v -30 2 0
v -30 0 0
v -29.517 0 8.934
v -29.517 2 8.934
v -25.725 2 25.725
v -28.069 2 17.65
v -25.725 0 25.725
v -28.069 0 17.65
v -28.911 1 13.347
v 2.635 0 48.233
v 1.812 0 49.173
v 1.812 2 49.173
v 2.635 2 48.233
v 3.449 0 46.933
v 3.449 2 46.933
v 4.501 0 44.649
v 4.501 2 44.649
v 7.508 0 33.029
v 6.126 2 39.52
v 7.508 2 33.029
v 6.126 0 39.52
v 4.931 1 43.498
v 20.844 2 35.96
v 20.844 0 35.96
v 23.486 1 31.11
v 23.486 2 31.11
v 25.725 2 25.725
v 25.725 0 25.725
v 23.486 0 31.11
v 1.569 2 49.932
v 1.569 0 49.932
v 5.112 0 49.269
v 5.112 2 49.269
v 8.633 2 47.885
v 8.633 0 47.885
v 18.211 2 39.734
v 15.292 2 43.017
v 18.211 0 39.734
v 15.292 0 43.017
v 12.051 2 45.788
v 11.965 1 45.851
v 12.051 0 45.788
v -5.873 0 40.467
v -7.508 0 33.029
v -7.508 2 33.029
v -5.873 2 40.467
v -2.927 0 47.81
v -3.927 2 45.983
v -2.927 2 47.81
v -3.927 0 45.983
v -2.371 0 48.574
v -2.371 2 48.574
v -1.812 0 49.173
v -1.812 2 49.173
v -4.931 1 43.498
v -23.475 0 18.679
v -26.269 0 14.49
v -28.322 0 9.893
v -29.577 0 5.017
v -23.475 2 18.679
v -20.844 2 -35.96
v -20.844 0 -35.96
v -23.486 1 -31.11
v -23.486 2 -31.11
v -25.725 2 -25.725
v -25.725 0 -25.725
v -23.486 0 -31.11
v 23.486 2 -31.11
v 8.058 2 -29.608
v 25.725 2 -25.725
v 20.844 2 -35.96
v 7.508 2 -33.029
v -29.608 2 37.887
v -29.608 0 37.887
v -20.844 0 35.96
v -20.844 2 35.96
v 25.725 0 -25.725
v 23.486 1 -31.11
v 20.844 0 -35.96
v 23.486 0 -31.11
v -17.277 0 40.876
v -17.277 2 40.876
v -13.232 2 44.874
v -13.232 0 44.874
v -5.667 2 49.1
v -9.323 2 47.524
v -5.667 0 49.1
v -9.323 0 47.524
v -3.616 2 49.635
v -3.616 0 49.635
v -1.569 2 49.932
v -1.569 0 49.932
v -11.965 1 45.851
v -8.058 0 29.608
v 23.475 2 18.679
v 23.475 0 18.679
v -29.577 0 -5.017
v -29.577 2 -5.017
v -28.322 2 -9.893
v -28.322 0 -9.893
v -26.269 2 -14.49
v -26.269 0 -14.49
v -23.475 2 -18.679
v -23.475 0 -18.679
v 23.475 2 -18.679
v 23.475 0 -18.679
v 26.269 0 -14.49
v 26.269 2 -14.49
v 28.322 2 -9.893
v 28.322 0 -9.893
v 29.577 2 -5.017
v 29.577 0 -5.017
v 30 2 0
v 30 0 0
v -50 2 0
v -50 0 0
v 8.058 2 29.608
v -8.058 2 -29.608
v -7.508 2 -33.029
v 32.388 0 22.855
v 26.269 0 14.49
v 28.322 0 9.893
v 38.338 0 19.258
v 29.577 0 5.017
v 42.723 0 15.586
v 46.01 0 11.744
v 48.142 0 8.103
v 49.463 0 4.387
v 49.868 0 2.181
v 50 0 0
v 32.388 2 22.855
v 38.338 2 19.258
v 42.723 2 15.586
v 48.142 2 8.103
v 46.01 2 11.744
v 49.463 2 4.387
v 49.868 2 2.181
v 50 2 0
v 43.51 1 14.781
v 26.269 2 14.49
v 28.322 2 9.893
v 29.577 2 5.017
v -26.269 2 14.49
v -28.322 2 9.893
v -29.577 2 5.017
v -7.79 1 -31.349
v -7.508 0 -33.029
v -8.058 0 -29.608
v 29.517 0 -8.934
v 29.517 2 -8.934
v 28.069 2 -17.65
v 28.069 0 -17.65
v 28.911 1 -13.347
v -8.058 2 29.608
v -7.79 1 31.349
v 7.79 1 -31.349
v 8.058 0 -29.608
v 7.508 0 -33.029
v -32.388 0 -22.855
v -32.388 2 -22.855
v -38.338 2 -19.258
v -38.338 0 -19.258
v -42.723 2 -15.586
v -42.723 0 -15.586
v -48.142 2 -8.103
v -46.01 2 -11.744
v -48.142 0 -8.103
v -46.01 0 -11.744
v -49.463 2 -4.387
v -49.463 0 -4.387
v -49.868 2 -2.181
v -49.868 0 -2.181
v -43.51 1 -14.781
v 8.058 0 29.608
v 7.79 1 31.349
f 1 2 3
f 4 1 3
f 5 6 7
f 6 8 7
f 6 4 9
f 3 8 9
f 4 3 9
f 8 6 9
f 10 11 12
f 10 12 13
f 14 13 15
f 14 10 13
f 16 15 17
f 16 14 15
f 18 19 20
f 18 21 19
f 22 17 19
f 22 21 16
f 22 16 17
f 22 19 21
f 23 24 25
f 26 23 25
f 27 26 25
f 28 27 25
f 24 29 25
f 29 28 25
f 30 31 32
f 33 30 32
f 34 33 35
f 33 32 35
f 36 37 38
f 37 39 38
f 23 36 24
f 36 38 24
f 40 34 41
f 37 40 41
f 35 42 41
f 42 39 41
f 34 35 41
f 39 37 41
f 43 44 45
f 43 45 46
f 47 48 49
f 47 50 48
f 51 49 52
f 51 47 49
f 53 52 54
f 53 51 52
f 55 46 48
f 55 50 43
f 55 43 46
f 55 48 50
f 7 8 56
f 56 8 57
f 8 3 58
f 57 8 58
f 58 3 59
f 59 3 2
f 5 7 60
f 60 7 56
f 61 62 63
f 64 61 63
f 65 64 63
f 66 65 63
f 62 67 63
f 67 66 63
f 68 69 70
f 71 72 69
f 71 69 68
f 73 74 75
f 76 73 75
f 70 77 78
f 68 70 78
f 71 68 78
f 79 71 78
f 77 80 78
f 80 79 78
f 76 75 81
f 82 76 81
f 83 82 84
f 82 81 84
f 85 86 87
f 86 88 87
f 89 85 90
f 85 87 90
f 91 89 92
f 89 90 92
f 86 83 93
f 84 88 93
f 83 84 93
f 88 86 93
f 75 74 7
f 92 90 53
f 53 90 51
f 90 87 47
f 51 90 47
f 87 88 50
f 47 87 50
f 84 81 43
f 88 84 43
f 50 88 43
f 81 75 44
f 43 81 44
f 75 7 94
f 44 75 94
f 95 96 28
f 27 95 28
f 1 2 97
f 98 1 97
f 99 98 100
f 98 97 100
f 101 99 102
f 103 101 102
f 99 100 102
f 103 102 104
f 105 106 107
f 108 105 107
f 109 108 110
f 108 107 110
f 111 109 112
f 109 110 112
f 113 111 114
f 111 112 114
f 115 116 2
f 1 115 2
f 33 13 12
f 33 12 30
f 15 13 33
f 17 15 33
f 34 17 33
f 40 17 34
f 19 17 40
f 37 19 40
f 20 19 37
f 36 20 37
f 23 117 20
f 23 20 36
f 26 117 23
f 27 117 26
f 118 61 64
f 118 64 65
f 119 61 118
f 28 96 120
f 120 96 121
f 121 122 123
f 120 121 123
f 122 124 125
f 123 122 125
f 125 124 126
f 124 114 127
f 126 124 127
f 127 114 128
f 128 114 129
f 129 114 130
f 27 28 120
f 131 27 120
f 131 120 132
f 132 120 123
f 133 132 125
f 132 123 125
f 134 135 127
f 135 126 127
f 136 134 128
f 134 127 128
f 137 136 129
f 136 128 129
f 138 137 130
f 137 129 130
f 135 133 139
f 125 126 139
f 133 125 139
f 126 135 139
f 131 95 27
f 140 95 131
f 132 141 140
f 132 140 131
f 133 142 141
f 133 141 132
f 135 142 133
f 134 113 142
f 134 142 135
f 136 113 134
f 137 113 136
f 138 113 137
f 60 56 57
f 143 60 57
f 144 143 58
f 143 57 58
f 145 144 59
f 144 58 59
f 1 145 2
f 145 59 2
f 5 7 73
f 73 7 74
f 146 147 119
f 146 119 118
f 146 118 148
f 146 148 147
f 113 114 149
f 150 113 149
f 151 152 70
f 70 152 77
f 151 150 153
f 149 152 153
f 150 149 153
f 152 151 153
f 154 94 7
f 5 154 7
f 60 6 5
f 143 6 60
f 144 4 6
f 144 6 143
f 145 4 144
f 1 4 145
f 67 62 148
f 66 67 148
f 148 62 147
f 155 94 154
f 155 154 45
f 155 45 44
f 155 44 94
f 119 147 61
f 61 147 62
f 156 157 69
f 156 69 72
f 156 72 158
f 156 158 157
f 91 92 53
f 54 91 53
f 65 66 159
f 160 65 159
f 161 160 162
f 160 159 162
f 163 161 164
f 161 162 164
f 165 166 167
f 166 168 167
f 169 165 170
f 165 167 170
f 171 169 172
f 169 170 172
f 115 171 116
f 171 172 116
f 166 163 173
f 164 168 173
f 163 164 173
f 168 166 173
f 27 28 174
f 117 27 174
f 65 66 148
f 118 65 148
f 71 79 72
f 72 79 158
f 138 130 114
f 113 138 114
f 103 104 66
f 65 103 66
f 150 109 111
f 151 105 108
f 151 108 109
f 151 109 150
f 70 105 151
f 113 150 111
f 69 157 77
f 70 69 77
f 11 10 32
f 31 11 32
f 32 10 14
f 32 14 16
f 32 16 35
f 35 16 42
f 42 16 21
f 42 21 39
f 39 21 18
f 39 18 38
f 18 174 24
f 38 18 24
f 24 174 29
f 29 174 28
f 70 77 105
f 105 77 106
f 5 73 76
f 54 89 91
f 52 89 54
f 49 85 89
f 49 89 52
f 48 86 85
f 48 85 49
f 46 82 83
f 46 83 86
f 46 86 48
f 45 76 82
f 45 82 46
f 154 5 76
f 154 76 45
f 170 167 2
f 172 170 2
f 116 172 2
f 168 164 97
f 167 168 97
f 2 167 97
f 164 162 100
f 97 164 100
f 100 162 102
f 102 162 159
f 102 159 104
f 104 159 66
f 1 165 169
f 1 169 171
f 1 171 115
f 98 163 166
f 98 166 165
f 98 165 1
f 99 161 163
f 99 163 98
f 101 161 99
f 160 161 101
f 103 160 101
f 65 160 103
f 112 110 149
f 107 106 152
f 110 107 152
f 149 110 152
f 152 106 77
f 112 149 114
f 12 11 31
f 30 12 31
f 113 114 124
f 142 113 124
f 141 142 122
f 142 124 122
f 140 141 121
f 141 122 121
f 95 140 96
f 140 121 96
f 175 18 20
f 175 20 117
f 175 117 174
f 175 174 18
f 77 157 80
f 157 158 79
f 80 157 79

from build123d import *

# Parameters (mm, degrees)
DODANIE_WYCI_GNI_CIE1_DEPTH   = 2
DODANIE_WYCI_GNI_CIE1_2_DEPTH = 2
DODANIE_WYCI_GNI_CIE1_3_DEPTH = 2
DODANIE_WYCI_GNI_CIE1_4_DEPTH = 2
DODANIE_WYCI_GNI_CIE1_5_DEPTH = 2
DODANIE_WYCI_GNI_CIE1_6_DEPTH = 2
DODANIE_WYCI_GNI_CIE1_7_DEPTH = 2
DODANIE_WYCI_GNI_CIE1_8_DEPTH = 2


with BuildPart() as part:
    # Szkic1 → Dodanie-wyciągnięcie1 (new body)
    with BuildSketch(Plane(origin=(0, 0, 0), x_dir=(1, 0, 0), z_dir=(0, 1, 0))):
        with BuildLine():
            Line((-25.724787771, 25.724787771), (-8.05822964, 29.607826273))
            add(Edge.make_bspline(
                [(-7.507535684, 33.029118956), (-7.79792239, 31.378992774), (-8.05822964, 29.607826273)],
                knots=[0.849202104, 0.849202104, 0.849202104, 0.937063931, 0.937063931, 0.937063931], degree=2, weights=[1, 0.999035193, 1]))
            Line((-7.507535684, 33.029118956), (-20.843852414, 35.960387795))
            add(Edge.make_bspline(
                [(-20.843852414, 35.960387795), (-23.68927397, 31.378992774), (-25.724787771, 25.724787771)],
                knots=[3.909727591, 3.909727591, 3.909727591, 4.17196948, 4.17196948, 4.17196948], degree=2, weights=[1, 0.991415958, 1]))
        make_face()
    extrude(amount=DODANIE_WYCI_GNI_CIE1_DEPTH)


with BuildPart() as body_2:
    # Szkic1 → Dodanie-wyci_gni_cie1 2 (new body)
    with BuildSketch(Plane(origin=(0, 0, 0), x_dir=(1, 0, 0), z_dir=(0, 1, 0))):
        with BuildLine():
            Line((-23.475270357, 18.679177757), (-25.724787771, 25.724787771))
            add(Edge.make_bspline(
                [(-25.724787771, 25.724787771), (-50, 16.985711369), (-50, 0)],
                knots=[2.111215827, 2.111215827, 2.111215827, 3.141592654, 3.141592654, 3.141592654], degree=2, weights=[1, 0.870199907, 1]))
            Line((-50, 0), (-30, 0))
            ThreePointArc((-30, 9.5e-08), (-28.321882961, 9.892974554), (-23.475270357, 18.679177757))
        make_face()
    extrude(amount=DODANIE_WYCI_GNI_CIE1_2_DEPTH)


with BuildPart() as body_3:
    # Szkic1 → Dodanie-wyci_gni_cie1 3 (new body)
    with BuildSketch(Plane(origin=(0, 0, 0), x_dir=(1, 0, 0), z_dir=(0, 1, 0))):
        with BuildLine():
            ThreePointArc((-23.475270357, -18.679177757), (-28.321882992, -9.892974465), (-30, 9.5e-08))
            add(Edge.make_bspline(
                [(-30, 9.5e-08), (-30.000000016, -13.849198204), (-25.724787771, -25.724787771)],
                knots=[4.712388978, 4.712388978, 4.712388978, 5.252808481, 5.252808481, 5.252808481], degree=2, weights=[1, 0.963714928, 1]))
            Line((-25.724787771, -25.724787771), (-23.475270357, -18.679177757))
        make_face()
    extrude(amount=DODANIE_WYCI_GNI_CIE1_3_DEPTH)


with BuildPart() as body_4:
    # Szkic1 → Dodanie-wyci_gni_cie1 4 (new body)
    with BuildSketch(Plane(origin=(0, 0, 0), x_dir=(1, 0, 0), z_dir=(0, 1, 0))):
        with BuildLine():
            Line((-29.607826273, -37.88667404), (-20.843852414, -35.960387795))
            add(Edge.make_bspline(
                [(-20.843852414, -35.960387795), (-12.774167321, -48.953336072), (-1.56928672, -49.931545896)],
                knots=[5.51505037, 5.51505037, 5.51505037, 6.230851865, 6.230851865, 6.230851865], degree=2, weights=[1, 0.936634273, 1]))
            Line((-1.56928672, -49.931545896), (-1.811566447, -49.17271271))
            add(Edge.make_bspline(
                [(-7.507535684, -33.029118956), (-5.218865934, -46.034514162), (-1.811566447, -49.17271271)],
                knots=[2.292390549, 2.292390549, 2.292390549, 2.959430225, 2.959430225, 2.959430225], degree=2, weights=[1, 0.944895907, 1]))
            add(Edge.make_bspline(
                [(-8.05822964, -29.607826273), (-7.79792239, -31.378992774), (-7.507535684, -33.029118956)],
                knots=[2.204528722, 2.204528722, 2.204528722, 2.292390549, 2.292390549, 2.292390549], degree=2, weights=[1, 0.999035193, 1]))
            Line((-8.05822964, -29.607826273), (-25.724787771, -25.724787771))
            Line((-25.724787771, -25.724787771), (-29.607826273, -37.88667404))
        make_face()
    extrude(amount=DODANIE_WYCI_GNI_CIE1_4_DEPTH)


with BuildPart() as body_5:
    # Szkic1 → Dodanie-wyci_gni_cie1 5 (new body)
    with BuildSketch(Plane(origin=(0, 0, 0), x_dir=(1, 0, 0), z_dir=(0, 1, 0))):
        with BuildLine():
            Line((8.05822964, 29.607826273), (25.724787771, 25.724787771))
            add(Edge.make_bspline(
                [(25.724787771, 25.724787771), (23.68927397, 31.378992774), (20.843852414, 35.960387795)],
                knots=[2.111215827, 2.111215827, 2.111215827, 2.373457716, 2.373457716, 2.373457716], degree=2, weights=[1, 0.991415958, 1]))
            Line((20.843852414, 35.960387795), (7.507535684, 33.029118956))
            add(Edge.make_bspline(
                [(8.05822964, 29.607826273), (7.79792239, 31.378992774), (7.507535684, 33.029118956)],
                knots=[5.346121376, 5.346121376, 5.346121376, 5.433983203, 5.433983203, 5.433983203], degree=2, weights=[1, 0.999035193, 1]))
        make_face()
    extrude(amount=DODANIE_WYCI_GNI_CIE1_5_DEPTH)


with BuildPart() as body_6:
    # Szkic1 → Dodanie-wyci_gni_cie1 6 (new body)
    with BuildSketch(Plane(origin=(0, 0, 0), x_dir=(1, 0, 0), z_dir=(0, 1, 0))):
        with BuildLine():
            add(Edge.make_bspline(
                [(30, 0), (30, 13.849198247), (25.724787771, 25.724787771)],
                knots=[1.570796327, 1.570796327, 1.570796327, 2.111215827, 2.111215827, 2.111215827], degree=2, weights=[1, 0.963714928, 1]))
            Line((25.724787771, 25.724787771), (23.475270357, 18.679177757))
            ThreePointArc((23.475270357, 18.679177757), (28.321882977, 9.89297451), (30, 0))
        make_face()
    extrude(amount=DODANIE_WYCI_GNI_CIE1_6_DEPTH)


with BuildPart() as body_7:
    # Szkic1 → Dodanie-wyci_gni_cie1 7 (new body)
    with BuildSketch(Plane(origin=(0, 0, 0), x_dir=(1, 0, 0), z_dir=(0, 1, 0))):
        with BuildLine():
            add(Edge.make_bspline(
                [(20.843852414, -35.960387795), (23.68927397, -31.378992774), (25.724787771, -25.724787771)],
                knots=[0.768134938, 0.768134938, 0.768134938, 1.030376827, 1.030376827, 1.030376827], degree=2, weights=[1, 0.991415958, 1]))
            Line((25.724787771, -25.724787771), (8.05822964, -29.607826273))
            add(Edge.make_bspline(
                [(7.507535684, -33.029118956), (7.79792239, -31.378992774), (8.05822964, -29.607826273)],
                knots=[3.990794758, 3.990794758, 3.990794758, 4.078656585, 4.078656585, 4.078656585], degree=2, weights=[1, 0.999035193, 1]))
            add(Edge.make_bspline(
                [(1.811566447, -49.17271271), (5.218865934, -46.034514162), (7.507535684, -33.029118956)],
                knots=[3.323755082, 3.323755082, 3.323755082, 3.990794758, 3.990794758, 3.990794758], degree=2, weights=[1, 0.944895907, 1]))
            Line((1.811566447, -49.17271271), (1.56928672, -49.931545896))
            add(Edge.make_bspline(
                [(1.56928672, -49.931545896), (12.774167321, -48.953336072), (20.843852414, -35.960387795)],
                knots=[0.052333442, 0.052333442, 0.052333442, 0.768134938, 0.768134938, 0.768134938], degree=2, weights=[1, 0.936634273, 1]))
        make_face()
    extrude(amount=DODANIE_WYCI_GNI_CIE1_7_DEPTH)


with BuildPart() as body_8:
    # Szkic1 → Dodanie-wyci_gni_cie1 8 (new body)
    with BuildSketch(Plane(origin=(0, 0, 0), x_dir=(1, 0, 0), z_dir=(0, 1, 0))):
        with BuildLine():
            Line((23.475270357, -18.679177757), (25.724787771, -25.724787771))
            add(Edge.make_bspline(
                [(25.724787771, -25.724787771), (50, -16.985711369), (50, 0)],
                knots=[5.252808481, 5.252808481, 5.252808481, 6.283185307, 6.283185307, 6.283185307], degree=2, weights=[1, 0.870199907, 1]))
            Line((50, 0), (30, 0))
            ThreePointArc((30, 0), (28.321882977, -9.89297451), (23.475270357, -18.679177757))
        make_face()
    extrude(amount=DODANIE_WYCI_GNI_CIE1_8_DEPTH)


solid = Compound([part.part, body_2.part, body_3.part, body_4.part, body_5.part, body_6.part, body_7.part, body_8.part])
